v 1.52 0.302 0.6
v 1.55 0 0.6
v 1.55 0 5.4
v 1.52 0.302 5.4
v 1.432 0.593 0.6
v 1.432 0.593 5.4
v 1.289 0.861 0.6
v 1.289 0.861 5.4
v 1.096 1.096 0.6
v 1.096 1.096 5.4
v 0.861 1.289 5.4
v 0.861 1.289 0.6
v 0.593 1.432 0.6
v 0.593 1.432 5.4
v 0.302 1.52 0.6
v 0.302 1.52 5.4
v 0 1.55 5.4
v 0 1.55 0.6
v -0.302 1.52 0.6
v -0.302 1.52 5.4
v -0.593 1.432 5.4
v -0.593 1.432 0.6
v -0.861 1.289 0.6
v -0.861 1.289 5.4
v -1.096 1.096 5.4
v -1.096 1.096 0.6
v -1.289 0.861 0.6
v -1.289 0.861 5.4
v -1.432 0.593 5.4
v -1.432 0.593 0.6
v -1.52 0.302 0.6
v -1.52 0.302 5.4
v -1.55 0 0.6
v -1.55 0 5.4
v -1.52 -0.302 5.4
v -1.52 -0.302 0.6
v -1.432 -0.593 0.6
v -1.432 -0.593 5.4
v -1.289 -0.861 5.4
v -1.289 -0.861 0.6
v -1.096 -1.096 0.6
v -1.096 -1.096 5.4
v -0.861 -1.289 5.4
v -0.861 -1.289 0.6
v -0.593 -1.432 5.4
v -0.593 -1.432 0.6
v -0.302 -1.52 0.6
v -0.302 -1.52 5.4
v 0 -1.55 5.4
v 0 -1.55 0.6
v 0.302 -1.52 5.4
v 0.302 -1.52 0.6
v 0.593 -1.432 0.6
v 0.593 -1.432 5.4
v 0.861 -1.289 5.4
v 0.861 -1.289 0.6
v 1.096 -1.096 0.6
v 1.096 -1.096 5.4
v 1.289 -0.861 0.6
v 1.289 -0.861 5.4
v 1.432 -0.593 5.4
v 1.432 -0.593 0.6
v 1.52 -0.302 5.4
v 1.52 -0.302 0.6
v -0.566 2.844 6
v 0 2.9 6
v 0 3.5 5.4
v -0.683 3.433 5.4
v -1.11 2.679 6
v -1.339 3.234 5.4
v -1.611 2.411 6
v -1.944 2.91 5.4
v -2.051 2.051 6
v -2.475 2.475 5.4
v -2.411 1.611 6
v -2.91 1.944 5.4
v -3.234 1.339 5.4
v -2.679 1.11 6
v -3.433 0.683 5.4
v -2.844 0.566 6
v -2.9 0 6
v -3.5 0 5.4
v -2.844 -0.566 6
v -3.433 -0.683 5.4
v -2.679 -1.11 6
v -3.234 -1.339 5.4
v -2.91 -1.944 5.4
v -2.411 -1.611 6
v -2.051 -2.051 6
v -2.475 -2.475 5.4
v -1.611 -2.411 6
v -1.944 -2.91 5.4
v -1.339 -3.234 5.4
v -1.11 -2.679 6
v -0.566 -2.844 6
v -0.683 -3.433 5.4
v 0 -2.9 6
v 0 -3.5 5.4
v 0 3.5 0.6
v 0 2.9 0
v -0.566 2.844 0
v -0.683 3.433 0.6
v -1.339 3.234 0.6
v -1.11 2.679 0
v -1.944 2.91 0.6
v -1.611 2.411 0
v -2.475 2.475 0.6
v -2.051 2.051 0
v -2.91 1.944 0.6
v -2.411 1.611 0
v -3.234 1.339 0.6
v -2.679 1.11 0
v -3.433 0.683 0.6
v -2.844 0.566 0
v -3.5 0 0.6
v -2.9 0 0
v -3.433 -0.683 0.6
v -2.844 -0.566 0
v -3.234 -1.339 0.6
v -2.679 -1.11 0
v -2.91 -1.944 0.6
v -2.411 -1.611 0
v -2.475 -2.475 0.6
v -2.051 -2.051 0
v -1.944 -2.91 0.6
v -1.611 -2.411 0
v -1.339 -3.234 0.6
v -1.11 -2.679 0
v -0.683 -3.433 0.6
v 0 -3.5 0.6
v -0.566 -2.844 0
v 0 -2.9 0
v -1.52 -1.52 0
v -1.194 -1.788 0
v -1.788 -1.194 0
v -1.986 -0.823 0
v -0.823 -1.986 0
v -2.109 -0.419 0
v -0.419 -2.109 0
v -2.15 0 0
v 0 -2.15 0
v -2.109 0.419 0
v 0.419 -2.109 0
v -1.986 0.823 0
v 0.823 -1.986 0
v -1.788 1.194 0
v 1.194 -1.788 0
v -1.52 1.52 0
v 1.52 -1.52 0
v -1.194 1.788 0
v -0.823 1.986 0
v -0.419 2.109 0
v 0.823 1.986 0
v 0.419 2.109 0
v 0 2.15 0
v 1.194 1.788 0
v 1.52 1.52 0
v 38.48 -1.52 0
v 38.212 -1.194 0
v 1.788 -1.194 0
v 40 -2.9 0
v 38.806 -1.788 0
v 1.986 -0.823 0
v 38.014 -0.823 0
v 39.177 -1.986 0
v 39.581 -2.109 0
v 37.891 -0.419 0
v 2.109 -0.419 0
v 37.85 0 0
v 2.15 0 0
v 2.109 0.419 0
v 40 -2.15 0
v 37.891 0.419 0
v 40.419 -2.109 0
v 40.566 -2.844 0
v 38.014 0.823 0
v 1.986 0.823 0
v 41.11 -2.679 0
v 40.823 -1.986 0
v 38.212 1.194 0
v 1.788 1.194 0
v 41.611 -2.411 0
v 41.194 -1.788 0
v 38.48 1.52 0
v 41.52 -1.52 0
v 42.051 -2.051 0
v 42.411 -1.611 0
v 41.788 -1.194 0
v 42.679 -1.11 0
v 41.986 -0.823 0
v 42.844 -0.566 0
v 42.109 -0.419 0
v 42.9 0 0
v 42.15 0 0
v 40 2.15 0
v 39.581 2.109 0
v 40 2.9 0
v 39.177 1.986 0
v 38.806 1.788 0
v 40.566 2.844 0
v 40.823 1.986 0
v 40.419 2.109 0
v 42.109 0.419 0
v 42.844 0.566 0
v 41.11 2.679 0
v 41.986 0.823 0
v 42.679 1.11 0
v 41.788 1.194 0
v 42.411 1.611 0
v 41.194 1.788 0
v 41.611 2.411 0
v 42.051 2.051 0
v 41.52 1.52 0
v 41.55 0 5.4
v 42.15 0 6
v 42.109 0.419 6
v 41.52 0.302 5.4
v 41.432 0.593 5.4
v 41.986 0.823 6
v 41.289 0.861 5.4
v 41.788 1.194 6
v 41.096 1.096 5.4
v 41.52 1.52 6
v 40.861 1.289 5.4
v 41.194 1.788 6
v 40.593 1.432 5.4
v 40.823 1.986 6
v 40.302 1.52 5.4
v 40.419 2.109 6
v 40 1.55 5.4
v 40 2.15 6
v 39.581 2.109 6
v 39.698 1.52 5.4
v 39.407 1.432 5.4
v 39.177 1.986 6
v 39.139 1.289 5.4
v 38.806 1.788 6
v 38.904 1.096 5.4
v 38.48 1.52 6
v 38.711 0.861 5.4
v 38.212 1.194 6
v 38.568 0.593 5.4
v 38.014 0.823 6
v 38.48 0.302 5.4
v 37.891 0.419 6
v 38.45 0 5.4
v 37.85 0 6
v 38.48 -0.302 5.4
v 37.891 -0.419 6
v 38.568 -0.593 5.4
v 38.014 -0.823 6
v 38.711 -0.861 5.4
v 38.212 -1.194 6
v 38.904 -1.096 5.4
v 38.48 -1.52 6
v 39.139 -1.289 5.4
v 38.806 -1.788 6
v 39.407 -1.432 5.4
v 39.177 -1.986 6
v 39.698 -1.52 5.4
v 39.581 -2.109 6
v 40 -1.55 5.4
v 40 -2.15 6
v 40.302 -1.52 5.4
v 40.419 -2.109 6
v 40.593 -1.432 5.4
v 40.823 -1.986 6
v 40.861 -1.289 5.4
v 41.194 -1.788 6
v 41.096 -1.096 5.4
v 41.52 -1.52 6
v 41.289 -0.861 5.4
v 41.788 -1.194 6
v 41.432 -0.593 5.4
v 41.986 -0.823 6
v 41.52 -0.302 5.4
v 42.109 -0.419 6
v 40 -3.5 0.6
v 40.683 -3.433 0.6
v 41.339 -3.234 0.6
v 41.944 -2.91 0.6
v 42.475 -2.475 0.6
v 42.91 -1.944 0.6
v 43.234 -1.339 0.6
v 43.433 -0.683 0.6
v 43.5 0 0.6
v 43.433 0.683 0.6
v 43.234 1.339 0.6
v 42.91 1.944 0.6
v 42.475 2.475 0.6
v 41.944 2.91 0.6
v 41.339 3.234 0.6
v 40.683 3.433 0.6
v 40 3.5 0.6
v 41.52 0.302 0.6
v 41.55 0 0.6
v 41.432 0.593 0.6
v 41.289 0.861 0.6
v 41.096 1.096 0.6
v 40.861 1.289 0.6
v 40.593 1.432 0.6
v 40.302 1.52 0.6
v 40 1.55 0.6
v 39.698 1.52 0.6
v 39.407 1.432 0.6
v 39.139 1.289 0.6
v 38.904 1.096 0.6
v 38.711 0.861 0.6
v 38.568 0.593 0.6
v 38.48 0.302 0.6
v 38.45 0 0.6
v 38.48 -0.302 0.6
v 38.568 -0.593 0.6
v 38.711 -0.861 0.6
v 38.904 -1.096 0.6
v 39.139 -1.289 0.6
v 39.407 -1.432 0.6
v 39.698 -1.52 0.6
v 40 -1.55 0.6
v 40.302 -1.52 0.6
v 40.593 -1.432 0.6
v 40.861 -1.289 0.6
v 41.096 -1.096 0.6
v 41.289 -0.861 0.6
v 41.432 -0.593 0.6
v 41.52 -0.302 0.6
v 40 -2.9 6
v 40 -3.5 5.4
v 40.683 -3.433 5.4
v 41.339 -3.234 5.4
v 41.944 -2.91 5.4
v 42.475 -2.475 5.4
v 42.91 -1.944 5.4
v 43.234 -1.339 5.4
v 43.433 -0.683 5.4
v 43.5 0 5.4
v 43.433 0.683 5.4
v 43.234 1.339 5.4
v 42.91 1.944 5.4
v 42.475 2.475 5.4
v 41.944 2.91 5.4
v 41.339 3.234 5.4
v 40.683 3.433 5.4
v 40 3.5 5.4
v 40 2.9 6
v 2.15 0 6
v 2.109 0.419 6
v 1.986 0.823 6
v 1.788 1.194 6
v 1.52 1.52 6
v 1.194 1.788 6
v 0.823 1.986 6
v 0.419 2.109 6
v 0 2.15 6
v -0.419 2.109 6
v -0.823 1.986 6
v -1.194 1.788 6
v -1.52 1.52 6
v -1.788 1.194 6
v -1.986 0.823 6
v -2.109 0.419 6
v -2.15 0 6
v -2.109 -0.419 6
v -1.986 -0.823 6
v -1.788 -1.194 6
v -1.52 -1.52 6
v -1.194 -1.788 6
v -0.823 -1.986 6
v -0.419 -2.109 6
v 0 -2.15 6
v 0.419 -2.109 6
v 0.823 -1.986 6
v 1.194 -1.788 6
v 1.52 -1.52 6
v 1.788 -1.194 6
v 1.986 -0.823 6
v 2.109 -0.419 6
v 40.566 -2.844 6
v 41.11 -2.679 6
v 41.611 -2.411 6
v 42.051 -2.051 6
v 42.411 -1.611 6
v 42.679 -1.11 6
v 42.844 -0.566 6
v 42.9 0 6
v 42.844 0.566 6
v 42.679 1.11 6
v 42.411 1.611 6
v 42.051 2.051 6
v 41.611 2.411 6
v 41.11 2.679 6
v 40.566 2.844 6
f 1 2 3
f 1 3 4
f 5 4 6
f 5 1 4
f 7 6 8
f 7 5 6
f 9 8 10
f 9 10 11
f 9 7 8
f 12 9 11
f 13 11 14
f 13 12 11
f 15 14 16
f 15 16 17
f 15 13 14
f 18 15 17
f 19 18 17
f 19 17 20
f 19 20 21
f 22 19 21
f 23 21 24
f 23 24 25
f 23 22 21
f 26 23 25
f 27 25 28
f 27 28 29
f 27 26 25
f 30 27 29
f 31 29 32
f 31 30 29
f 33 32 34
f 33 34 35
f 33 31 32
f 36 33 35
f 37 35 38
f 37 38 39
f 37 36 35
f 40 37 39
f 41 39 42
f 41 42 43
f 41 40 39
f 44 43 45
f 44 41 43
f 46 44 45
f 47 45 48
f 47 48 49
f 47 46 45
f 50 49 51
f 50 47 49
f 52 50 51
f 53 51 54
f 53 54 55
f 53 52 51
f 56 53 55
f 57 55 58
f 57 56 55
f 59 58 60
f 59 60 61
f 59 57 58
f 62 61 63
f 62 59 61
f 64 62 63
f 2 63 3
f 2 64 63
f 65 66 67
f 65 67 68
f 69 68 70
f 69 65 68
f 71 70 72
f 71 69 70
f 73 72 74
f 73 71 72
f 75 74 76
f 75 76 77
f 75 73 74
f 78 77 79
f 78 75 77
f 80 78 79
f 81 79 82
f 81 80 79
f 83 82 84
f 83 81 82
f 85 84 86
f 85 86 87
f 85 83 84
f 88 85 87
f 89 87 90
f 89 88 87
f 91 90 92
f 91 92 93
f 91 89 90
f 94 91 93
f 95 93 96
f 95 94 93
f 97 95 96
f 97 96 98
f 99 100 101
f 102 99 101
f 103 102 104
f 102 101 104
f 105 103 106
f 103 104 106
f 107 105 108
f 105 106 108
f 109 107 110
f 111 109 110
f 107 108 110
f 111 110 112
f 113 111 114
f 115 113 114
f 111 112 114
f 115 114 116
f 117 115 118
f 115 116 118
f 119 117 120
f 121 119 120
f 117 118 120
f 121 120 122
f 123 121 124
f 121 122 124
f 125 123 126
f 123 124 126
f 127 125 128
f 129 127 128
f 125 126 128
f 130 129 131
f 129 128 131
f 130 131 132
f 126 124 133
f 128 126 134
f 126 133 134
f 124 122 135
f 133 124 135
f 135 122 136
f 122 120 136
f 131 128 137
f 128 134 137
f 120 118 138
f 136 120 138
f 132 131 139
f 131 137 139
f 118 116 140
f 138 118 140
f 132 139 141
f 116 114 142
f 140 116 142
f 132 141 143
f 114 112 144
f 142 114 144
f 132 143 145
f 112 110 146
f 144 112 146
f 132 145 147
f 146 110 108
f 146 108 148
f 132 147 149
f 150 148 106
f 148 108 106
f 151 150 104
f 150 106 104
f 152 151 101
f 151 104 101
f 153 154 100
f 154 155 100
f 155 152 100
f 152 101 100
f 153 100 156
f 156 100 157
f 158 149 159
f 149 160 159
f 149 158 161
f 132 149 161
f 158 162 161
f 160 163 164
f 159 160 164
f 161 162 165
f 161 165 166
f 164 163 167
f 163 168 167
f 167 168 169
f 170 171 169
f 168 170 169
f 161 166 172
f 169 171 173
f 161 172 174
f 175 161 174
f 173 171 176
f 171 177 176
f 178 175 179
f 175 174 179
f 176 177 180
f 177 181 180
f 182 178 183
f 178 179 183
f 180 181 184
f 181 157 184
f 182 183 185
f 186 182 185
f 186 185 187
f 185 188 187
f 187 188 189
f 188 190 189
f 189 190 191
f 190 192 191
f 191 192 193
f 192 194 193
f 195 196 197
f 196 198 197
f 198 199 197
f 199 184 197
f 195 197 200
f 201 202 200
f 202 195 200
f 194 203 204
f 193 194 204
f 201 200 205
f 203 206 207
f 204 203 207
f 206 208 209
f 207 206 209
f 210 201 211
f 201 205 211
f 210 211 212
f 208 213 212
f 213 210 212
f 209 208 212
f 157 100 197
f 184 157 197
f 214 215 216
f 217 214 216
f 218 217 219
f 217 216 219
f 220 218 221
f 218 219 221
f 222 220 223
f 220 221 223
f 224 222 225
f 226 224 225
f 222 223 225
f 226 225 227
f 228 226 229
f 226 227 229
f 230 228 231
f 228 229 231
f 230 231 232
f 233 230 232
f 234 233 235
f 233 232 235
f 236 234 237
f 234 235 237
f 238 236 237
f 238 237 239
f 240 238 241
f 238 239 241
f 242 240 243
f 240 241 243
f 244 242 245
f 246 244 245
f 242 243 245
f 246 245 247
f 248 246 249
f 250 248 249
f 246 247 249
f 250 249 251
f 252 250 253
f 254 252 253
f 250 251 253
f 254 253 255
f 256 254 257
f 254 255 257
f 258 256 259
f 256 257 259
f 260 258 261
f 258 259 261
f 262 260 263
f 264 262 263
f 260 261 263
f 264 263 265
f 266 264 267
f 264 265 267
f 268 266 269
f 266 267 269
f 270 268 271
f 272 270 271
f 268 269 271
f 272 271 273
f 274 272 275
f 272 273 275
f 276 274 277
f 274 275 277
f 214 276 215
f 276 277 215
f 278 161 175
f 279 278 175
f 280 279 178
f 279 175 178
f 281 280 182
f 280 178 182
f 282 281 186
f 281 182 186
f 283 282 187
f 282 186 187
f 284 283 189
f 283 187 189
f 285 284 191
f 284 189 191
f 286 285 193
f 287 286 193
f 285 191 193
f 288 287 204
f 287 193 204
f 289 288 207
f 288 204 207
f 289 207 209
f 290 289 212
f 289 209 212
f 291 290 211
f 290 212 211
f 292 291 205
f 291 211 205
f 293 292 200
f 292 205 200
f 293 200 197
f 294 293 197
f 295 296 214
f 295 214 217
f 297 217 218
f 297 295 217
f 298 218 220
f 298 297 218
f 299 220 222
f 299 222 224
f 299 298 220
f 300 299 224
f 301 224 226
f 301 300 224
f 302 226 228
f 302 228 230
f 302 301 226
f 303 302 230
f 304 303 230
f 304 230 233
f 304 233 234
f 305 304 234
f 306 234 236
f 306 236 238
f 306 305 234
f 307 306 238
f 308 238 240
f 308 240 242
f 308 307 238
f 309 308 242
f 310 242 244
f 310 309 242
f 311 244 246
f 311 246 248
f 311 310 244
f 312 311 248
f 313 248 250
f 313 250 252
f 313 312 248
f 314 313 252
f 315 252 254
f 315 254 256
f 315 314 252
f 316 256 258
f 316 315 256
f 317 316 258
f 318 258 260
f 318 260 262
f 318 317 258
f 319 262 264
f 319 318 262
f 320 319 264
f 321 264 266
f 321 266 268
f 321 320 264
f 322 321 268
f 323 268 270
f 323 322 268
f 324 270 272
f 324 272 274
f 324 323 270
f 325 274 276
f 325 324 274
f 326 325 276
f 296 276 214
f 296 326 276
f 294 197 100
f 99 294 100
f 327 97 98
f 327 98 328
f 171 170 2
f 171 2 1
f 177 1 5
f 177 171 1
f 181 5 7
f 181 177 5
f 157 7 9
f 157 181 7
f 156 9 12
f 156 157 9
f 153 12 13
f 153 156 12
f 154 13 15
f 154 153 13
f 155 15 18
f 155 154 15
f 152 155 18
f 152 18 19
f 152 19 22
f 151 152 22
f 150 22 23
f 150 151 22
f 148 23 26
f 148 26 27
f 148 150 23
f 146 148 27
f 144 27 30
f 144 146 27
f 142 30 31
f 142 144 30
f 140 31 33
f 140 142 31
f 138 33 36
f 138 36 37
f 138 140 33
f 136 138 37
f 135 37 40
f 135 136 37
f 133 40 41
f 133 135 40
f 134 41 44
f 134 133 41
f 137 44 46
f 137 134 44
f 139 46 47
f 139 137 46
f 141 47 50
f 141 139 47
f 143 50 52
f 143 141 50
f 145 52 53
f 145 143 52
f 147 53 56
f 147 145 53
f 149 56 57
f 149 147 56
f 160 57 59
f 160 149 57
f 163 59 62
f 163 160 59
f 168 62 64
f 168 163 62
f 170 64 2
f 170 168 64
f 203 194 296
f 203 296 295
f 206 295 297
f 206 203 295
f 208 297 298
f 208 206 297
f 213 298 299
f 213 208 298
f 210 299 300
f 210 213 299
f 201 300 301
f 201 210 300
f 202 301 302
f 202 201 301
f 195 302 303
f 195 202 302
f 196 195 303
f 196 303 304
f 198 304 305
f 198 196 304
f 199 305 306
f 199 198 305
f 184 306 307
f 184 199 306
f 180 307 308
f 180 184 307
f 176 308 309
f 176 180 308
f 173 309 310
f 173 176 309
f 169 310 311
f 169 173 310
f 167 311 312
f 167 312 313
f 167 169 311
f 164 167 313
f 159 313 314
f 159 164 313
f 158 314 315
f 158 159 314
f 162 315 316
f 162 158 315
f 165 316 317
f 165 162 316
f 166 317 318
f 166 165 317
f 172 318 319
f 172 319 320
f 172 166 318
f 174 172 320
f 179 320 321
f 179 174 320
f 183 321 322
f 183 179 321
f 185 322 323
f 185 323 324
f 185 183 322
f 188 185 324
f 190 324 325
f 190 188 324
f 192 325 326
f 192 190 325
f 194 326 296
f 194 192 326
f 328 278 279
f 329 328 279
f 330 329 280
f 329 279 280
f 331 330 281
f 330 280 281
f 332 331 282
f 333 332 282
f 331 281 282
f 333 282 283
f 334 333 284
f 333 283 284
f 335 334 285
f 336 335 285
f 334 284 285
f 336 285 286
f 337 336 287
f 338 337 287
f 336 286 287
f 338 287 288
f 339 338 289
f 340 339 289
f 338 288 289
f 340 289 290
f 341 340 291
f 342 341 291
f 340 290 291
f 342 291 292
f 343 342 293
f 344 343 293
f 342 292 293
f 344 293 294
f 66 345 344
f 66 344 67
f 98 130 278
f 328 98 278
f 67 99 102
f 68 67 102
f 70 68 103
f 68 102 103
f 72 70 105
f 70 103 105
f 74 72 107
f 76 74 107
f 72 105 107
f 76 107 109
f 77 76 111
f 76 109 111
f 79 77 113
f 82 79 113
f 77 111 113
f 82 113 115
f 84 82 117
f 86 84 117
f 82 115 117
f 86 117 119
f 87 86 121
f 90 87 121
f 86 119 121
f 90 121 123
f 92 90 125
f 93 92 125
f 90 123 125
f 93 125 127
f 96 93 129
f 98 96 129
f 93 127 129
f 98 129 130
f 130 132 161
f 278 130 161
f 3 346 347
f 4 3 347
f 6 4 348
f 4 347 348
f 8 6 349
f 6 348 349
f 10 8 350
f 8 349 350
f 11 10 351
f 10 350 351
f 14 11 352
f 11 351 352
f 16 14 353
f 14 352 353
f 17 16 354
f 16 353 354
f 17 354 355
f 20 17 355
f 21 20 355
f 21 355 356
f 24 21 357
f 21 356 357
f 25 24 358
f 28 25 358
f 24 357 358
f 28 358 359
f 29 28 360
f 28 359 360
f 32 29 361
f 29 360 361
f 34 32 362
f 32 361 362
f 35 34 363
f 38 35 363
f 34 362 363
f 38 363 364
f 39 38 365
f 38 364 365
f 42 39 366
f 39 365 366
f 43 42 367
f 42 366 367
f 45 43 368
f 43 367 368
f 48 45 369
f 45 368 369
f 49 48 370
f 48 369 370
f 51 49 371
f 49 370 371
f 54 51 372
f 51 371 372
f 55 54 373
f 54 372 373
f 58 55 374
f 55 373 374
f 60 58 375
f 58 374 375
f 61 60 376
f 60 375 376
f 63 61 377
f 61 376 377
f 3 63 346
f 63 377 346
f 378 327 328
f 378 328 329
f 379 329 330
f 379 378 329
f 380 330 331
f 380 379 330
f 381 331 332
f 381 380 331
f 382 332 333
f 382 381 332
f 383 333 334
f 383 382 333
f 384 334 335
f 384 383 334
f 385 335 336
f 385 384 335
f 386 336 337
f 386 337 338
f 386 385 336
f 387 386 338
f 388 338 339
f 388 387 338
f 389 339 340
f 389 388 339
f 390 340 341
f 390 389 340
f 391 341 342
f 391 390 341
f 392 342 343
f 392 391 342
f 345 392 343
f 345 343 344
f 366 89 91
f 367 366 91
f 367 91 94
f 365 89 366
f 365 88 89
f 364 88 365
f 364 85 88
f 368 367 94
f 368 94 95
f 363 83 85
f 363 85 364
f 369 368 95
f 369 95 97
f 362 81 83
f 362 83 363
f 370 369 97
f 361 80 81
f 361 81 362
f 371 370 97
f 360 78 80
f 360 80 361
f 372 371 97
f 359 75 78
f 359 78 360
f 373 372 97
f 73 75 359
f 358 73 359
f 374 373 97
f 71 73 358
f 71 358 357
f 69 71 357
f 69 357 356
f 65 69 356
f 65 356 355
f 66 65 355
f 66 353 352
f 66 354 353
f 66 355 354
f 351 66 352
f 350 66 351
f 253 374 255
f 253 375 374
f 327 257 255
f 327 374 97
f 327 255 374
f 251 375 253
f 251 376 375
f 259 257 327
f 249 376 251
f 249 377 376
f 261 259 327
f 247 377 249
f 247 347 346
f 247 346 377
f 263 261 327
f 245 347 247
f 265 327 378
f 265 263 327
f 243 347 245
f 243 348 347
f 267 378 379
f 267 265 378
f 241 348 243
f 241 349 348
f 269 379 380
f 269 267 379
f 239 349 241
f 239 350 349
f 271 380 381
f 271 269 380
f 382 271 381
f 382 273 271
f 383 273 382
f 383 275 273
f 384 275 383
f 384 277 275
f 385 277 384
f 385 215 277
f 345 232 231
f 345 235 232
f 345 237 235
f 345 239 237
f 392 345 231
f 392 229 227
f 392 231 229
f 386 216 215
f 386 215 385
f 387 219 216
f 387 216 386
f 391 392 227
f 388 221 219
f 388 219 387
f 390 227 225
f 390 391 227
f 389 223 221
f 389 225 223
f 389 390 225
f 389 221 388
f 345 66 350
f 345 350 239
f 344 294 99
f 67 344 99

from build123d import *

# Parameters (mm, degrees)
SKETCH_1_R      = 1.55
EXTRUDE_1_DEPTH = 6
CHAMFER_1_SIZE  = 0.6


with BuildPart() as part:
    # 草图1 → 凸台-拉伸1 (new body)
    with BuildSketch(Plane.XY):
        with BuildLine():
            ThreePointArc((0, 3.5), (-3.5, 0), (0, -3.5))
            Line((0, -3.5), (40, -3.5))
            ThreePointArc((40, -3.5), (43.5, 0), (40, 3.5))
            Line((40, 3.5), (0, 3.5))
        make_face()
        Circle(SKETCH_1_R, mode=Mode.SUBTRACT)
        with Locations((40, 0)):
            Circle(SKETCH_1_R, mode=Mode.SUBTRACT)
    extrude(amount=EXTRUDE_1_DEPTH)

    # 倒角1
    chamfer_1_edges = [part.edges().sort_by_distance(p)[0] for p in [
        (43.5, 0, 6),
        (20, 3.5, 6),
        (-3.5, 0, 6),
        (38.45, 0, 6),
        (-1.55, 0, 6),
        (20, -3.5, 6),
        (-1.55, 0, 0),
        (38.45, 0, 0),
        (-3.5, 0, 0),
        (20, 3.5, 0),
        (43.5, 0, 0),
        (20, -3.5, 0),
    ]]
    chamfer(chamfer_1_edges, length=CHAMFER_1_SIZE)


solid = part.part
